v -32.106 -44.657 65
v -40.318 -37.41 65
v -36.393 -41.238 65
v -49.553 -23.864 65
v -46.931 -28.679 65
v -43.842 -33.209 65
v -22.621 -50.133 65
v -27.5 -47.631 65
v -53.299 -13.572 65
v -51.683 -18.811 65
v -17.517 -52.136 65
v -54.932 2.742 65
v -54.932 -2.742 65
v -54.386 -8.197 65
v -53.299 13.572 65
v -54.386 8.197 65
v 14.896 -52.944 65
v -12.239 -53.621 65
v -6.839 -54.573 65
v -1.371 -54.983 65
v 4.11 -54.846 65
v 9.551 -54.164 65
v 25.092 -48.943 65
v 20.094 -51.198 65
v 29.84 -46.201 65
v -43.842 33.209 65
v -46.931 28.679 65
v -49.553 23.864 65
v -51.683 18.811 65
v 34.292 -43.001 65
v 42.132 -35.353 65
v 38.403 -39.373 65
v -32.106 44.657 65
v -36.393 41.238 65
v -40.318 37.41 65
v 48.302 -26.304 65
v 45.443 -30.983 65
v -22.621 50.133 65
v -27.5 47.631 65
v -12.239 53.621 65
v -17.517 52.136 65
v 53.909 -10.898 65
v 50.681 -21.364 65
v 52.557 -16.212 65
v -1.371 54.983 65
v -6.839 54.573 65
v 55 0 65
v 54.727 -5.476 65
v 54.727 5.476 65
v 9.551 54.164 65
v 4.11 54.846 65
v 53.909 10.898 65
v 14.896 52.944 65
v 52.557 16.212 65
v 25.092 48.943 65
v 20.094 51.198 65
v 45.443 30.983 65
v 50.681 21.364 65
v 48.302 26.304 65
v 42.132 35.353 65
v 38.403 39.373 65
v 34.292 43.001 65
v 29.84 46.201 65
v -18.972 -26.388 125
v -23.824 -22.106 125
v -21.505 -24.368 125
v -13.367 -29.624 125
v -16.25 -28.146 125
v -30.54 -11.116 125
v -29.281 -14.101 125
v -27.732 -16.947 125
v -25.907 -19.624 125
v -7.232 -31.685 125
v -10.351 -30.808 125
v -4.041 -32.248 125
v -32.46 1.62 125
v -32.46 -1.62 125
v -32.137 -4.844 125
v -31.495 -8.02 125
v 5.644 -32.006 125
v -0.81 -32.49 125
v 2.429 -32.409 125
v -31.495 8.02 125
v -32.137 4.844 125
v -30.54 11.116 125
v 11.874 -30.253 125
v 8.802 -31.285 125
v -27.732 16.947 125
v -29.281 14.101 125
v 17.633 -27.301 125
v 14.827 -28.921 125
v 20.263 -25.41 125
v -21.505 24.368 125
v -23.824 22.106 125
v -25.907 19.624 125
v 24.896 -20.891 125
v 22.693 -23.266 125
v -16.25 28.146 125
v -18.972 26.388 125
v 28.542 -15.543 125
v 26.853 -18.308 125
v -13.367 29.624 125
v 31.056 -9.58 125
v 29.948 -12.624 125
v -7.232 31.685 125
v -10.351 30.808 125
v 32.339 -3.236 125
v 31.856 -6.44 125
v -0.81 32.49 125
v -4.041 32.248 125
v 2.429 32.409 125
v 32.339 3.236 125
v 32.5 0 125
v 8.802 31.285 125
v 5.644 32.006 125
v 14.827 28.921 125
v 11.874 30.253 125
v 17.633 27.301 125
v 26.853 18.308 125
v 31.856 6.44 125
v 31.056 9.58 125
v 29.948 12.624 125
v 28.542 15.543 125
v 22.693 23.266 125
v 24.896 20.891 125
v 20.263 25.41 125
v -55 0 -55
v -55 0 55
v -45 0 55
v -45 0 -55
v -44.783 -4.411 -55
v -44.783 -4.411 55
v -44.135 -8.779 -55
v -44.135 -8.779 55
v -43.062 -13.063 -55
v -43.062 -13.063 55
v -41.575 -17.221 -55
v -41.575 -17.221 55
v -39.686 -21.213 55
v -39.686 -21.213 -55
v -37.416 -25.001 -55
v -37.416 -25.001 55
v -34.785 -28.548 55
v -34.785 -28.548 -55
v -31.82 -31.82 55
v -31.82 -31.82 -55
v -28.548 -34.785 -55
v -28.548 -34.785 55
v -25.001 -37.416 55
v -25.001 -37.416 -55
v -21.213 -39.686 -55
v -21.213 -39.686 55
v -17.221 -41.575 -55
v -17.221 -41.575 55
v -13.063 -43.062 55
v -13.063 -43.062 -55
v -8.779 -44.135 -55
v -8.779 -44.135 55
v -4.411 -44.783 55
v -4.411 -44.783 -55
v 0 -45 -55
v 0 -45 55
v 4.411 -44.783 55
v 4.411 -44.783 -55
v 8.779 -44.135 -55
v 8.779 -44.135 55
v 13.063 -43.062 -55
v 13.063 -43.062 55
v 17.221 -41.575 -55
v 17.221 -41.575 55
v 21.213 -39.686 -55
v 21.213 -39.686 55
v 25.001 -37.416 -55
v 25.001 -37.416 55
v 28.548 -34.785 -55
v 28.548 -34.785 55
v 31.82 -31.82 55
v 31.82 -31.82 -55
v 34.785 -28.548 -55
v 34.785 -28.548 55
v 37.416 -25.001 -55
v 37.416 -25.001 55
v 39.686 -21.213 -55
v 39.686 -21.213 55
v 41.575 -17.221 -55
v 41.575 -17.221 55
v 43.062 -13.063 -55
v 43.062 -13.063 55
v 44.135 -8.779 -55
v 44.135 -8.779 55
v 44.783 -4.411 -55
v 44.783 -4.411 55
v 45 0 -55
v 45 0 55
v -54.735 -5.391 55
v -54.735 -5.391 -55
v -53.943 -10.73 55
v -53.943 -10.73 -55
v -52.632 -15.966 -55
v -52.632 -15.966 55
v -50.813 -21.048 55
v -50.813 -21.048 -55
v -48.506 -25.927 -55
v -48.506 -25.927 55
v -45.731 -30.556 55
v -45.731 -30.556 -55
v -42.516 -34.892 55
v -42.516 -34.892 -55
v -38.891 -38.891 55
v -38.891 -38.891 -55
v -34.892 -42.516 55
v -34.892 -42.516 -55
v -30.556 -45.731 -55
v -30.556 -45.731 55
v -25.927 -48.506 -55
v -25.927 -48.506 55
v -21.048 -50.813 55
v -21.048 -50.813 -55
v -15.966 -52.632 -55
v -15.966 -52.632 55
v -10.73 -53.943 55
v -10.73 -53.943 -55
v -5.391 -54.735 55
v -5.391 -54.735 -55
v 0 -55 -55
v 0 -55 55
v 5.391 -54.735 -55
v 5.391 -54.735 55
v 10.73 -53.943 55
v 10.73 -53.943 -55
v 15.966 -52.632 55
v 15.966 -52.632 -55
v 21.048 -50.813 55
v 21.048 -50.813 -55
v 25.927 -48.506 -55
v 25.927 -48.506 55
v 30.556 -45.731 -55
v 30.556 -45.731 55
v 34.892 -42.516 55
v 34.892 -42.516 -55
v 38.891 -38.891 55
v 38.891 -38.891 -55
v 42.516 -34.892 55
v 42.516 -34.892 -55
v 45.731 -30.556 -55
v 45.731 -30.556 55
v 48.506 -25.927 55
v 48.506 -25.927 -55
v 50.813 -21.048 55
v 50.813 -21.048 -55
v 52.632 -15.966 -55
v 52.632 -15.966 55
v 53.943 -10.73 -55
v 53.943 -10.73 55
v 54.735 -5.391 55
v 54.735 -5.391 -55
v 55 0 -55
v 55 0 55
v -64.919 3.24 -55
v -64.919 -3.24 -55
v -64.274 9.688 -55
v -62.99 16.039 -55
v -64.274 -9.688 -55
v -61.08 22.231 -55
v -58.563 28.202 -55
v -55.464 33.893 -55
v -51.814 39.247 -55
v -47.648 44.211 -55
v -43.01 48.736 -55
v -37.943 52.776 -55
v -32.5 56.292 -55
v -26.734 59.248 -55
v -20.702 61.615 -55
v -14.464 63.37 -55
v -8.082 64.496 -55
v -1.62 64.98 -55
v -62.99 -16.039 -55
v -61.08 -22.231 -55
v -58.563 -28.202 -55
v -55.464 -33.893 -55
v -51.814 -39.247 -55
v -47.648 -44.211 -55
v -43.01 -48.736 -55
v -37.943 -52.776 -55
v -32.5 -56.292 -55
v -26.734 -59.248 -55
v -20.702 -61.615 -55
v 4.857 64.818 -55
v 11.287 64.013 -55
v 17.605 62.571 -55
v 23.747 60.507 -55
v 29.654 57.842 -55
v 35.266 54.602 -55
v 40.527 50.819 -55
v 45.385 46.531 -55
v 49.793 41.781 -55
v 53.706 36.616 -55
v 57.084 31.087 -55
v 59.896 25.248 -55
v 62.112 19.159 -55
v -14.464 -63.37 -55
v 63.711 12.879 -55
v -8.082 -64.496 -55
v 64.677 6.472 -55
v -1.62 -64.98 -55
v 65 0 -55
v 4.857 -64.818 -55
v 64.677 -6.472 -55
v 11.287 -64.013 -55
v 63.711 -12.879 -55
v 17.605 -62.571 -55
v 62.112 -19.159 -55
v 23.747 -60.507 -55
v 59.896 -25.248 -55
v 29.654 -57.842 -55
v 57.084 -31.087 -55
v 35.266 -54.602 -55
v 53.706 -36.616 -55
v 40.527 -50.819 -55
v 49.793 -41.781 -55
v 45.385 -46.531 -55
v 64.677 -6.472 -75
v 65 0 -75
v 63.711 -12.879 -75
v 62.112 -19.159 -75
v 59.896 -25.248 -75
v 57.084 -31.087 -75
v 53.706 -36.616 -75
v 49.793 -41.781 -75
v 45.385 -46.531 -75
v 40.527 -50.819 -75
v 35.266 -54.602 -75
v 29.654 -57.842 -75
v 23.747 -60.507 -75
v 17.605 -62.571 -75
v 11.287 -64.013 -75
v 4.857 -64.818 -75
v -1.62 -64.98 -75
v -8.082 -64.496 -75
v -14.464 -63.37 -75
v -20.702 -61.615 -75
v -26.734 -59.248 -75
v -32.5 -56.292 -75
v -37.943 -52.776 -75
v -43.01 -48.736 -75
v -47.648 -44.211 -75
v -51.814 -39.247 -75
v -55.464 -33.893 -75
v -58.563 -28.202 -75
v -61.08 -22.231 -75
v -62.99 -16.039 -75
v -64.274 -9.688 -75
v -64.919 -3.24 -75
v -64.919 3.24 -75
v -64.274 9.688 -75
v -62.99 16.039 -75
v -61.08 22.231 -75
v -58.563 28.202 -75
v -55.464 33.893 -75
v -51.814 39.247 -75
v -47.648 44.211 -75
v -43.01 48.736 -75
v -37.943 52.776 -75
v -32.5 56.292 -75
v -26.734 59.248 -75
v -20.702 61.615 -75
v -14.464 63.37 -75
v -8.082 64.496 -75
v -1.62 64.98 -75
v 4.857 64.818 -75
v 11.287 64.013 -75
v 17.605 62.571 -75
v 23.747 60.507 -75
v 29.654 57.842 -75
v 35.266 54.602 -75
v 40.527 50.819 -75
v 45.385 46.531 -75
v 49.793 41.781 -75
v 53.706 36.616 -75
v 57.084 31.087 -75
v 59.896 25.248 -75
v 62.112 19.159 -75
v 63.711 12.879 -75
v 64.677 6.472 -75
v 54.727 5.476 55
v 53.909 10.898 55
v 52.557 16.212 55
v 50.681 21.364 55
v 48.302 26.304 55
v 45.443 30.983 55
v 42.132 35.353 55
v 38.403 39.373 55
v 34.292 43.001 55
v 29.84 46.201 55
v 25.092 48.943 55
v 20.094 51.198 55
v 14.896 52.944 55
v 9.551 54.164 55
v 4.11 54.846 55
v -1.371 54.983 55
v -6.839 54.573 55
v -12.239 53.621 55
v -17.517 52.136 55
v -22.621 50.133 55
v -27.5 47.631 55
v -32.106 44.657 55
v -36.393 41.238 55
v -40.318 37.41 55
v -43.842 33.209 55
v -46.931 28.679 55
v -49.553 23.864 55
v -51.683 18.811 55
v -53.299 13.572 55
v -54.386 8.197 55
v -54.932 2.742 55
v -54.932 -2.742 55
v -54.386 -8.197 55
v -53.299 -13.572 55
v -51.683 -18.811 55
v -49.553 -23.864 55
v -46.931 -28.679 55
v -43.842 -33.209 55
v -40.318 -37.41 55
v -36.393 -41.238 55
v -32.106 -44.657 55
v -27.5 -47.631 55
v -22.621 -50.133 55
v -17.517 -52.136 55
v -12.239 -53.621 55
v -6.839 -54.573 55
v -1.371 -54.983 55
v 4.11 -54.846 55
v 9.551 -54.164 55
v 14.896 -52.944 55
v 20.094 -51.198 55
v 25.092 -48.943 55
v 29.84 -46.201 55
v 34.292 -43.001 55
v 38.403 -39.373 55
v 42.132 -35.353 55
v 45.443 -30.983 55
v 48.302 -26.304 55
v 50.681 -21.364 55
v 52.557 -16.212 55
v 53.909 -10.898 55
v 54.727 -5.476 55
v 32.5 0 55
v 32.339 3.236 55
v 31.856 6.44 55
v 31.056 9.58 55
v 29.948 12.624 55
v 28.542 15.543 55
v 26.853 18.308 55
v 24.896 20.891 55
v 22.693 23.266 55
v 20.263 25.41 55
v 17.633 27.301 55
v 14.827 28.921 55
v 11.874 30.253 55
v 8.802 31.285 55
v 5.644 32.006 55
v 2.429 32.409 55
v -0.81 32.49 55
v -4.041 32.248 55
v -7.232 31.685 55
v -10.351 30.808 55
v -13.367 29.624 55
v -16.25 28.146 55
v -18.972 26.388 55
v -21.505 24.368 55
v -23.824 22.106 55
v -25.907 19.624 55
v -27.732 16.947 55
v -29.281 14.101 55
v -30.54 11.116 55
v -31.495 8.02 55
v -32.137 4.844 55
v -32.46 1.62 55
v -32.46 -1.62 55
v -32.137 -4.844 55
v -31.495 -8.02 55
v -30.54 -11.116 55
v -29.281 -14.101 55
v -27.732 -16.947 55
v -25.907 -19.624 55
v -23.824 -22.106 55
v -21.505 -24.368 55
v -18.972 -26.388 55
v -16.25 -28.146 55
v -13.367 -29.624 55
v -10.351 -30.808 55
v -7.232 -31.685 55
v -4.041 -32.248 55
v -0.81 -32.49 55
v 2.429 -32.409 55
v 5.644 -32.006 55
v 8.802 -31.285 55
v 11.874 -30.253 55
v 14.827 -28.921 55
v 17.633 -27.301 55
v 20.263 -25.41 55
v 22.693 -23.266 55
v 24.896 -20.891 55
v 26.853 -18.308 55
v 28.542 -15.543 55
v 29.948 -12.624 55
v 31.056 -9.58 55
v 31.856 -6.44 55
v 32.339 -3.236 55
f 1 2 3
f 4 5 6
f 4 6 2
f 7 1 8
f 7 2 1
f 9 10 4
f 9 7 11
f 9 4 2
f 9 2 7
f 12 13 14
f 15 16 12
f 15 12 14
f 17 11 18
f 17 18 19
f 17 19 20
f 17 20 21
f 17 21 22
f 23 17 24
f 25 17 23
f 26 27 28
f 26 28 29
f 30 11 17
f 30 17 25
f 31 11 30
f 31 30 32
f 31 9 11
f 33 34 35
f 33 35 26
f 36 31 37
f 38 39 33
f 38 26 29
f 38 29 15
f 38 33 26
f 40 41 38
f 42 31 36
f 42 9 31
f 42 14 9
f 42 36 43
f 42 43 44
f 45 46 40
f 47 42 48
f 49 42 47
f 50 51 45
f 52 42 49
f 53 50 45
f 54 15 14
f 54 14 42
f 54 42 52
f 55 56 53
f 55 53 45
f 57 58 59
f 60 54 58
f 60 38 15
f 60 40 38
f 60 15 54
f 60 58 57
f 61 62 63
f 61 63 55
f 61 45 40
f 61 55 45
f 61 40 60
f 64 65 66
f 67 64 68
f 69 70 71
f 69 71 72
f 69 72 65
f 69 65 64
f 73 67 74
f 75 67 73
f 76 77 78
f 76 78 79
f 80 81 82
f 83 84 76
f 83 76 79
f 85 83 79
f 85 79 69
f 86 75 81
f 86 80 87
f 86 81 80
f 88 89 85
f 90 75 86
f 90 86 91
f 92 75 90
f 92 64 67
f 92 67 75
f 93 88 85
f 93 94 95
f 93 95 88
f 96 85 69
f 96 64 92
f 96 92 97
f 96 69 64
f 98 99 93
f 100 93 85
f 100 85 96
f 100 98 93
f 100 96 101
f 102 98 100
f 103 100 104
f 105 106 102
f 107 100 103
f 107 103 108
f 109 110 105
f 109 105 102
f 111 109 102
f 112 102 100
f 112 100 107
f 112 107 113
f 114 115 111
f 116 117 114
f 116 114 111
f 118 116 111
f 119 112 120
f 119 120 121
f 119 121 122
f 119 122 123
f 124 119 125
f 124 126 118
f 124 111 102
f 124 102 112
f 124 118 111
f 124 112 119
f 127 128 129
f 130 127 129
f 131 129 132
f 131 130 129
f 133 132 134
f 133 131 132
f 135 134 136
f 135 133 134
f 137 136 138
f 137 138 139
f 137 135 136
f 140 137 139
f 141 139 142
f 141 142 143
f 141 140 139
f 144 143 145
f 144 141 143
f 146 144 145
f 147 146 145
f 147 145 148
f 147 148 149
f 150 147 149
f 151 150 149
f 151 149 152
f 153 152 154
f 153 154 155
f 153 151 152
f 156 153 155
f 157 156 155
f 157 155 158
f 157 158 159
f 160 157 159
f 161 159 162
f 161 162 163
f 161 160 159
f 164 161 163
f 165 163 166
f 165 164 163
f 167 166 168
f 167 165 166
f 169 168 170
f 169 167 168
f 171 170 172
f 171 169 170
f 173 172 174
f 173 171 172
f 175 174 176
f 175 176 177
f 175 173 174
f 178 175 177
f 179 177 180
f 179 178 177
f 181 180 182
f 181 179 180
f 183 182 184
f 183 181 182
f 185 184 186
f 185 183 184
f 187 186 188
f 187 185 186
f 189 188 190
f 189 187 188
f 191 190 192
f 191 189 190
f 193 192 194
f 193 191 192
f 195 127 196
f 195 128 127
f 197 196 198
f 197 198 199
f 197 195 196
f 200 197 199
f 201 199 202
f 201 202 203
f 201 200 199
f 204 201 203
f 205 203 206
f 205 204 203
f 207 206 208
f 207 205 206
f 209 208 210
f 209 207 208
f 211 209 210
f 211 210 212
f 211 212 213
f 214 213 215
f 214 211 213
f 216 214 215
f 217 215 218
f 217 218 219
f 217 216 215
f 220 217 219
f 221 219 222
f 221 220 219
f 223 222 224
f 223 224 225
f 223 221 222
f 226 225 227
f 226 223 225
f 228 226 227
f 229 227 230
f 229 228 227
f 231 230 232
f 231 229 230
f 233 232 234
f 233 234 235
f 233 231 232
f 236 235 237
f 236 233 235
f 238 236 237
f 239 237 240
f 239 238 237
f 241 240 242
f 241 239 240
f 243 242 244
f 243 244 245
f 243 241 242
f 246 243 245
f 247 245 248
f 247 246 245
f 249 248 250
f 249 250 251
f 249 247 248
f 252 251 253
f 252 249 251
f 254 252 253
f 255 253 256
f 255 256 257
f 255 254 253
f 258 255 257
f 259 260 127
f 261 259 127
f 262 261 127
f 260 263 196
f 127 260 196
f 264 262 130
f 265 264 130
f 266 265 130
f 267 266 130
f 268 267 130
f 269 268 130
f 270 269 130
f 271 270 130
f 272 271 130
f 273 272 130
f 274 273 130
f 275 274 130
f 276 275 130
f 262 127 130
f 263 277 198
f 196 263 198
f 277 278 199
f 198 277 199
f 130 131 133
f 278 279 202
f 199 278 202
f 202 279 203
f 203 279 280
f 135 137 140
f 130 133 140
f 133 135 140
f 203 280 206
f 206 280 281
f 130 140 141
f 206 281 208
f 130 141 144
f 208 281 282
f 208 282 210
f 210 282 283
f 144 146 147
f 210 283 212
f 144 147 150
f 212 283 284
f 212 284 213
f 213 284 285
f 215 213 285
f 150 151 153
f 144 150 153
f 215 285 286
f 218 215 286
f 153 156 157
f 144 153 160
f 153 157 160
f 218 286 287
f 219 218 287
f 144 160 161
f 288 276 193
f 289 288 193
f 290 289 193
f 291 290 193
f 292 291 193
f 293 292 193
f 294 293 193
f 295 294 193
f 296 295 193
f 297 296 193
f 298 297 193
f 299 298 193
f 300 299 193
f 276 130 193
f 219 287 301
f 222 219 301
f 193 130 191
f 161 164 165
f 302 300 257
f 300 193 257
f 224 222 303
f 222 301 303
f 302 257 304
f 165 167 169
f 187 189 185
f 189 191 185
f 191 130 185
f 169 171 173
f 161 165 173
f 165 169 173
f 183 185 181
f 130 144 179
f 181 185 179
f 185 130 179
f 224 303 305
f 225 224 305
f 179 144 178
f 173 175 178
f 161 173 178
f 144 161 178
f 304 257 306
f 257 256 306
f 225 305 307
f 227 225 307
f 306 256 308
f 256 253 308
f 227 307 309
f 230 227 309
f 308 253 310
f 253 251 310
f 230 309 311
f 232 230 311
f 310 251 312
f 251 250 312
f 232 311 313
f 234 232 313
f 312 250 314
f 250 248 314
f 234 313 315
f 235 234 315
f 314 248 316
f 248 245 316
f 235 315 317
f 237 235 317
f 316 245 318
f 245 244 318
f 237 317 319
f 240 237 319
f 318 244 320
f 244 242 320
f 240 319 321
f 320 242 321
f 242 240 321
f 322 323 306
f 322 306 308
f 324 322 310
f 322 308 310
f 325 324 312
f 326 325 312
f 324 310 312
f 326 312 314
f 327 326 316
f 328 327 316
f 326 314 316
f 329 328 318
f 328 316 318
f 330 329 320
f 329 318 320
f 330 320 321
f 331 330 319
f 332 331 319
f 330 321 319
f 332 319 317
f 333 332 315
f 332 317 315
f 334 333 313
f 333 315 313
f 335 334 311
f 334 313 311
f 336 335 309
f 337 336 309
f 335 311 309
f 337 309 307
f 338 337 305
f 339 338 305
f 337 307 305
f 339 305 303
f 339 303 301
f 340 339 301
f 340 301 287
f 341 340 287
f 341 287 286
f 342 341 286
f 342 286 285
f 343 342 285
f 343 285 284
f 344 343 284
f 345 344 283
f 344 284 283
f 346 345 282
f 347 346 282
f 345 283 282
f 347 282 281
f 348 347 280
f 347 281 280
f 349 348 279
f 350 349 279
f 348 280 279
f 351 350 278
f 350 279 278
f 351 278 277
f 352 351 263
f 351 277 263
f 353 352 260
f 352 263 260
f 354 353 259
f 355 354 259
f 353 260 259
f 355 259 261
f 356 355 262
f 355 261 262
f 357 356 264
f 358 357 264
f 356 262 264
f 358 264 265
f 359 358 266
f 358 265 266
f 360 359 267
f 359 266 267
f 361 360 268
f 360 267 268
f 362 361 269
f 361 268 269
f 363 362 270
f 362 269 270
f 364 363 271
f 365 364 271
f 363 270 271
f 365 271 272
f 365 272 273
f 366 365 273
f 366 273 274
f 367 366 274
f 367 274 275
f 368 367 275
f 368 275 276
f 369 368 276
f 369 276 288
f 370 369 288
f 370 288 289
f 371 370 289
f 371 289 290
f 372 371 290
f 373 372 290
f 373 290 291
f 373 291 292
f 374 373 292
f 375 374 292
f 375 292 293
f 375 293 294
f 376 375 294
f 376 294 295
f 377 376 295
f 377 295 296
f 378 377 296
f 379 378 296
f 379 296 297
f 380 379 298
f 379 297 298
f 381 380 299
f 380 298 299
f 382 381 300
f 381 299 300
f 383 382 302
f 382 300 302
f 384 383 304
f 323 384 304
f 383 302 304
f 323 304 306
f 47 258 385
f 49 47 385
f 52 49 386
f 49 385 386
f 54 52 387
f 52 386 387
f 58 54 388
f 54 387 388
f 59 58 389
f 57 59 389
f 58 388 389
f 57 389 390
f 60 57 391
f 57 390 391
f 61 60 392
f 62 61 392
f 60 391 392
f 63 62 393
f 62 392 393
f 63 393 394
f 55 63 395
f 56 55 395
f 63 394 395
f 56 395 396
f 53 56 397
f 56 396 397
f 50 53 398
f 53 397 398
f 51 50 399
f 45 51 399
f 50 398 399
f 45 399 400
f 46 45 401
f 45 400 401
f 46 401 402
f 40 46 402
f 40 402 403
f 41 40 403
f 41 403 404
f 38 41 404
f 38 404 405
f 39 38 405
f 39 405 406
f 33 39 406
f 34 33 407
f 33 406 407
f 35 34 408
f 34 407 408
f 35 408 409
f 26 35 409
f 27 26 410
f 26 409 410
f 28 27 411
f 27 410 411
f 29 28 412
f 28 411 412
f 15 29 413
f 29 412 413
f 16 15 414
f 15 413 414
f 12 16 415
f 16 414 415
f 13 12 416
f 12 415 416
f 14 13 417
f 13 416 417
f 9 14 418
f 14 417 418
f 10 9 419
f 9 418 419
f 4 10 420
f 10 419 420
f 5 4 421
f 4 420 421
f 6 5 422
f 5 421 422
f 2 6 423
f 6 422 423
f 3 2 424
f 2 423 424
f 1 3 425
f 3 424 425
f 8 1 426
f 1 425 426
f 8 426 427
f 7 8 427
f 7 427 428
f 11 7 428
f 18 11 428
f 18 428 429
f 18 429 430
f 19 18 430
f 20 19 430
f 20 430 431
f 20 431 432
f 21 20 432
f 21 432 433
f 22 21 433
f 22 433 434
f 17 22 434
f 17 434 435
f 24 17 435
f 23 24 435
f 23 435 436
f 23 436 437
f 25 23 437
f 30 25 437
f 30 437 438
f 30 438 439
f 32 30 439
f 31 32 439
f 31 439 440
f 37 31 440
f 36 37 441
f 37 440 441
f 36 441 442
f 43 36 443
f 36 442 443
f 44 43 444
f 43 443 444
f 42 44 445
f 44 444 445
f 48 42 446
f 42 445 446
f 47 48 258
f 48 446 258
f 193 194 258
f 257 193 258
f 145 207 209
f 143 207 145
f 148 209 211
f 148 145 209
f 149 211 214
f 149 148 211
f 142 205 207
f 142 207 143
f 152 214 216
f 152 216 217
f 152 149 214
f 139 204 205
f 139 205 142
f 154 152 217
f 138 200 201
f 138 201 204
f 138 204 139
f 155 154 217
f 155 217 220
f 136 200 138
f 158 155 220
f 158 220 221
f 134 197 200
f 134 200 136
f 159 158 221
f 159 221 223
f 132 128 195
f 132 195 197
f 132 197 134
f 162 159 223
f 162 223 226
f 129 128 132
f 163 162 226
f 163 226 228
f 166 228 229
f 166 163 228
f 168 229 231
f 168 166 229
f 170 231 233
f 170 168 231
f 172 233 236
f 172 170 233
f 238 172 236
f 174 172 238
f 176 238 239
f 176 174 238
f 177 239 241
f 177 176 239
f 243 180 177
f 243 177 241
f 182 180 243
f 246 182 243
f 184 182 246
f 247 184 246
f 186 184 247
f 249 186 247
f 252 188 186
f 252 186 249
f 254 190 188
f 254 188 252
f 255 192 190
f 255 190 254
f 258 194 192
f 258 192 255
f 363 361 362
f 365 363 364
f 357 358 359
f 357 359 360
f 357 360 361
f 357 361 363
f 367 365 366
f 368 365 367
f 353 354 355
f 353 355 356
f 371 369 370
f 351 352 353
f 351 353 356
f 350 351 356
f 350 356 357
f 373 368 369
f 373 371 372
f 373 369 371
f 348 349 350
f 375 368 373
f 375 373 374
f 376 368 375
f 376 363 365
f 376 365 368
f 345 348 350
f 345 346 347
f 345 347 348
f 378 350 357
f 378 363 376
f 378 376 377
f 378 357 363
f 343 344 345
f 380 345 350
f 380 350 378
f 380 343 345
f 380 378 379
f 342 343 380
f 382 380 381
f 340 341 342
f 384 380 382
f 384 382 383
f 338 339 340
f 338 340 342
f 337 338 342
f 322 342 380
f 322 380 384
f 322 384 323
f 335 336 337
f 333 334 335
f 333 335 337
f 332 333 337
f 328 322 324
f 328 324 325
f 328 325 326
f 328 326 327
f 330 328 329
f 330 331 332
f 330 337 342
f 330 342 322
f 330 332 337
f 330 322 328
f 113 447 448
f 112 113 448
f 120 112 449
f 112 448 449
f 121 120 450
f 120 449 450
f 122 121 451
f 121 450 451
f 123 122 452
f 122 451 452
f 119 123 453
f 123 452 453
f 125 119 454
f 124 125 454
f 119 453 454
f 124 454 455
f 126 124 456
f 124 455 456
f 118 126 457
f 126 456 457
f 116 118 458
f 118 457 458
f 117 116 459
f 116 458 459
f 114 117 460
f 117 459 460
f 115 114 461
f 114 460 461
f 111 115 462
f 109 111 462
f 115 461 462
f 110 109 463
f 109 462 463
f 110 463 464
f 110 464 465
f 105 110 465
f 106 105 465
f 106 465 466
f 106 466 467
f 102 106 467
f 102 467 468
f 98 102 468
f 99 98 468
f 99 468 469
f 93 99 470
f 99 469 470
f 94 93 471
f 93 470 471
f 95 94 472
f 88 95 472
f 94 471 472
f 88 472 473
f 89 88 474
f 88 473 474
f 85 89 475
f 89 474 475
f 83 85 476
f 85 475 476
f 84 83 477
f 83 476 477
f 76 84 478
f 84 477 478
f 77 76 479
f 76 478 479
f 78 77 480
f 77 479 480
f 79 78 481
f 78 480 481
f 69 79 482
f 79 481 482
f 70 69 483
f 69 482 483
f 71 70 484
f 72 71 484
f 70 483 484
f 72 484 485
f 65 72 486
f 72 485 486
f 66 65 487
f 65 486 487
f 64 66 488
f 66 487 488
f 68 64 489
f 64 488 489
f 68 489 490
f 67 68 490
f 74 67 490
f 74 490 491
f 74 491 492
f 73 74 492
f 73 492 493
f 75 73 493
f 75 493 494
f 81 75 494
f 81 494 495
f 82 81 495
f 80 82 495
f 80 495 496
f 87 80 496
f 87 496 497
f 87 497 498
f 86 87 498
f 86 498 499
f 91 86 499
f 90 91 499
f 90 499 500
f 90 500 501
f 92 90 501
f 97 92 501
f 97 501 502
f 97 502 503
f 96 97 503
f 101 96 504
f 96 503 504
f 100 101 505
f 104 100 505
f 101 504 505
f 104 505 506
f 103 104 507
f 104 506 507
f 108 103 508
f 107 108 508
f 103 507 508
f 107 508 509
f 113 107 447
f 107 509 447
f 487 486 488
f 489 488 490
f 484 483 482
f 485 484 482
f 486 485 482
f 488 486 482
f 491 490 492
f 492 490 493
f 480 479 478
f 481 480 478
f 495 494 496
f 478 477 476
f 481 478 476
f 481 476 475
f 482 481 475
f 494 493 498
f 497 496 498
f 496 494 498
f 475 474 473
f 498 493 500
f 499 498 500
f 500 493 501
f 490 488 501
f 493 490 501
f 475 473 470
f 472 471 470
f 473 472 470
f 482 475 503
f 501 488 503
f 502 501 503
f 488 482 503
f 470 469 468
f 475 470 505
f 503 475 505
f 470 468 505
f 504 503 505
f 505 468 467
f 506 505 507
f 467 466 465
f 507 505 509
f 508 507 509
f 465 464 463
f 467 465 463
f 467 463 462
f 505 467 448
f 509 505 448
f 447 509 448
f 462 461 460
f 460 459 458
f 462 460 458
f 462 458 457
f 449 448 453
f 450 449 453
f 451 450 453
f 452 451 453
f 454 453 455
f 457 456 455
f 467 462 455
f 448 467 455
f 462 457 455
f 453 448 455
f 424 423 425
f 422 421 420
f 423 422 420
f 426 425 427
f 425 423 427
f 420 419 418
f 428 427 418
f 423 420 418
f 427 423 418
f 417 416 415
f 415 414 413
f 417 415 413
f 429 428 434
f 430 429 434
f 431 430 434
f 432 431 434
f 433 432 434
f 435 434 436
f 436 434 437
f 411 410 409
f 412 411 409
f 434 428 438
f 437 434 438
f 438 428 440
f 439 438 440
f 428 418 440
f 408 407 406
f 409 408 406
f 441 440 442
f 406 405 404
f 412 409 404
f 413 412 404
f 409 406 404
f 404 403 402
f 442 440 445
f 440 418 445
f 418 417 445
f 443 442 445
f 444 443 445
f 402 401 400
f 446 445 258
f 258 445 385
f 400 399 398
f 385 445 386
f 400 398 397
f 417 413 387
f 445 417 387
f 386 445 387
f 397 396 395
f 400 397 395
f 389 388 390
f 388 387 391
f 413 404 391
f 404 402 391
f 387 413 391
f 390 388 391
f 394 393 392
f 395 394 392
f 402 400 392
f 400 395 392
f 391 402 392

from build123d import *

# Parameters (mm, degrees)
F0_R      = 55
F0_R_2    = 45
F1_DEPTH  = 55
F3_DEPTH  = 130
F5_R      = 55
F6_DEPTH  = 10
F7_R      = 32.5
F8_DEPTH  = 70
F11_R     = 65
F12_DEPTH = 20


with BuildPart() as f1:
    # F0 (on Top) → F1 (new body, symmetric)
    with BuildSketch(Plane.XY):
        Circle(F0_R)
        Circle(F0_R_2, mode=Mode.SUBTRACT)
    extrude(amount=F1_DEPTH, both=True)

    # F2 (on face) → F3 (cut)
    with BuildSketch(Plane.XY.offset(55)):
        with BuildLine():
            ThreePointArc((-45, 0), (0, 45), (45, 0))
            Line((45, 0), (60, 0))
            ThreePointArc((60, 0), (0, 60), (-60, 0))
            Line((-60, 0), (-45, 0))
        make_face()
    extrude(amount=-F3_DEPTH, mode=Mode.SUBTRACT)

    # F11 (on offset) → F12 (join)
    with BuildSketch(Plane(origin=(0, 0, -55), x_dir=(1, 0, 0), z_dir=(0, 0, -1))):
        Circle(F11_R)
    extrude(amount=F12_DEPTH)


with BuildPart() as f6:
    # F5 (on offset) → F6 (new body)
    with BuildSketch(Plane.XY.offset(55)):
        Circle(F5_R)
    extrude(amount=F6_DEPTH)


with BuildPart() as f8:
    # F7 (on offset) → F8 (new body)
    with BuildSketch(Plane.XY.offset(55)):
        Circle(F7_R)
    extrude(amount=F8_DEPTH)


solid = Compound([f1.part, f6.part, f8.part])
